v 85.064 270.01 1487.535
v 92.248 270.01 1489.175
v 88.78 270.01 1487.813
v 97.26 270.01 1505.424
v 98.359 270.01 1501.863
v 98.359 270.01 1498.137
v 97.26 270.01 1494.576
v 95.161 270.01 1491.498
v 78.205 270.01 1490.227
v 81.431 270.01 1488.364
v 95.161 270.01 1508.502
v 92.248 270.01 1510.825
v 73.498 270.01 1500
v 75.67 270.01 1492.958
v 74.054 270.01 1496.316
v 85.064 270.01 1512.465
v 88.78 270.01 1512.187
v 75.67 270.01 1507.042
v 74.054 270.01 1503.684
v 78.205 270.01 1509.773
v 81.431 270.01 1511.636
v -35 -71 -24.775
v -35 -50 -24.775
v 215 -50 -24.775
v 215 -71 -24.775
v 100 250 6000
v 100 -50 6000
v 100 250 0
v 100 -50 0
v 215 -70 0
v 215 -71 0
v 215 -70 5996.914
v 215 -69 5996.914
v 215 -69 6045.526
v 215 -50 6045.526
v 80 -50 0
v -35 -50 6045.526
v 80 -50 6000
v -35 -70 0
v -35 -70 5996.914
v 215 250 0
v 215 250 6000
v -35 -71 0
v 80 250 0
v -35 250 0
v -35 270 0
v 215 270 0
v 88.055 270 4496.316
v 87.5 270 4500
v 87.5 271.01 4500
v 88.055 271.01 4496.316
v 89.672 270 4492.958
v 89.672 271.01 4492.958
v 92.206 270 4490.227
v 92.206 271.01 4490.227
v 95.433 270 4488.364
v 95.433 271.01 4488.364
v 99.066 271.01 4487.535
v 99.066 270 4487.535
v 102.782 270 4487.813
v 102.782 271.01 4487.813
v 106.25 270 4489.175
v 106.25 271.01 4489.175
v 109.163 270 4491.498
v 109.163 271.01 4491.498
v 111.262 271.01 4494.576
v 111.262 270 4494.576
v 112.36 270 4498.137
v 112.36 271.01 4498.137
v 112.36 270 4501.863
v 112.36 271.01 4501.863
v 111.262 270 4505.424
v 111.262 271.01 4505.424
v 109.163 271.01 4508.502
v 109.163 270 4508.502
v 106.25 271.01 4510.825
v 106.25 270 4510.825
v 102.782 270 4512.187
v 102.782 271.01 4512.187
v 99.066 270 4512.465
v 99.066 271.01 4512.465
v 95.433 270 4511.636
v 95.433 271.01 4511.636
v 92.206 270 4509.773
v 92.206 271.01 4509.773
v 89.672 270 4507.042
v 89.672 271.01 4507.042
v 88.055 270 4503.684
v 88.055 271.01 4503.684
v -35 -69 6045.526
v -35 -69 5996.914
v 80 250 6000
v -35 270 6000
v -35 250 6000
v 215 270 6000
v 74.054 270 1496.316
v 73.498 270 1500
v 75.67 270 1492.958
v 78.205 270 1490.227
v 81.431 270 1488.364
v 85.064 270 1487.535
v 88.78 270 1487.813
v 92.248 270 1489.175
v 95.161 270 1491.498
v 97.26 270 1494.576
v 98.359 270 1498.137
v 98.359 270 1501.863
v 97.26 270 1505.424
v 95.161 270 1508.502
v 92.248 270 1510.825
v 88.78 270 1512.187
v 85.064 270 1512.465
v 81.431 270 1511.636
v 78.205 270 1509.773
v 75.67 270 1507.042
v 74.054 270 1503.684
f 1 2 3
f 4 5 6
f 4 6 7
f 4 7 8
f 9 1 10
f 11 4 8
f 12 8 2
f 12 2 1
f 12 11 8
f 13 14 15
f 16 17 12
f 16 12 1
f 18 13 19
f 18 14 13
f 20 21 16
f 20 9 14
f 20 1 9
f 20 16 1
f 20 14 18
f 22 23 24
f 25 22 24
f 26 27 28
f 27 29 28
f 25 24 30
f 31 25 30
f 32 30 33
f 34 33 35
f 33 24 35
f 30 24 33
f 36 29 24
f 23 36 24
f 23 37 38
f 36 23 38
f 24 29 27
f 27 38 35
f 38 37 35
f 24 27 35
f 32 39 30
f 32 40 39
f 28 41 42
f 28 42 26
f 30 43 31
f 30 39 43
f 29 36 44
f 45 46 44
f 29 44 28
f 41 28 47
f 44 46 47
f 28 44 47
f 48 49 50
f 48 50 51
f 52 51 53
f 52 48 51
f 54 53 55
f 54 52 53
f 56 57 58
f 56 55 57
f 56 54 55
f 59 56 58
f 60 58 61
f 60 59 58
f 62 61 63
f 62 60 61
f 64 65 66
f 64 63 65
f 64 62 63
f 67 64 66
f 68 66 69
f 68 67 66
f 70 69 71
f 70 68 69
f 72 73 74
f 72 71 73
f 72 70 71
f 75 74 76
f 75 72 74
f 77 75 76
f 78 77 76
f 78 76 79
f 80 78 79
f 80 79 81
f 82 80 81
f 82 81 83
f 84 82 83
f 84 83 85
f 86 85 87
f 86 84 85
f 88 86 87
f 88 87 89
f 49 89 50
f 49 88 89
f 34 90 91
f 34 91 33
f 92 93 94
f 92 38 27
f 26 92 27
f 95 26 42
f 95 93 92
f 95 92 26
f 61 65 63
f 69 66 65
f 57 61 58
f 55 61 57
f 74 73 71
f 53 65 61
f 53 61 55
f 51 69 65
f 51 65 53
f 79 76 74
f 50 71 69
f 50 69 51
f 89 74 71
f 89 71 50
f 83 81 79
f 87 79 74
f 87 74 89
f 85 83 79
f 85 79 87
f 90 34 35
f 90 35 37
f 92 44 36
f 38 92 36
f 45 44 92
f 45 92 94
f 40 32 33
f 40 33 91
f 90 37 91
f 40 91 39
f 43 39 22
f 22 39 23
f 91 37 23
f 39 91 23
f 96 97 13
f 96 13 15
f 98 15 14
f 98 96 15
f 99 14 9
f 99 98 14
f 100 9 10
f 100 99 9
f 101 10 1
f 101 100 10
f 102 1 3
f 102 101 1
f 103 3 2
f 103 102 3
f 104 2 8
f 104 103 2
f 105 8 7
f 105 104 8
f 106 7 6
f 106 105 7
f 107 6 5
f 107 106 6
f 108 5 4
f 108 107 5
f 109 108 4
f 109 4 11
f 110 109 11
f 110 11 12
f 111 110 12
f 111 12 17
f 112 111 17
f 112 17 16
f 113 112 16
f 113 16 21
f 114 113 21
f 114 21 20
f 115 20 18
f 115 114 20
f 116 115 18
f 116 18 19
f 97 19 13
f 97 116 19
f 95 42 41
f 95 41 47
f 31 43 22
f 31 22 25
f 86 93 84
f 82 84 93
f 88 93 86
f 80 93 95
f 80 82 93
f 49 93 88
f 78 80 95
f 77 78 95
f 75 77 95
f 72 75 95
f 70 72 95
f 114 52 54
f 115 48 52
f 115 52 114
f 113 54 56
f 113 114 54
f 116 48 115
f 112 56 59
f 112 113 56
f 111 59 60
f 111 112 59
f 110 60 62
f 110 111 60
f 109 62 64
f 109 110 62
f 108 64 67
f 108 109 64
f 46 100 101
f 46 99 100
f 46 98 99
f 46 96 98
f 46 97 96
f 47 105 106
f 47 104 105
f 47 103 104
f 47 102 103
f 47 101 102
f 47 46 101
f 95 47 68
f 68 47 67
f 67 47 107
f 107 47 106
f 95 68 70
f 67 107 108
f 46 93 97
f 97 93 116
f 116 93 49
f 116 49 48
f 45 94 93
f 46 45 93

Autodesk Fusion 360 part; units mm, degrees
sketch "Sketch1" plane through (0, 0, 0) normal (0, 0, 1) x (1, 0, 0)
  line L0 (-35, -70) -> (215, -70)
  line L1 (215, -70) -> (215, -50)
  line L2 (215, -50) -> (-35, -50)
  line L3 (-35, -50) -> (-35, -70)
  line L4 (80, -50) -> (100, -50)
  line L5 (100, -50) -> (100, 250)
  line L6 (100, 250) -> (80, 250)
  line L7 (80, 250) -> (80, -50)
  line L8 (-35, 250) -> (-35, 270)
  line L9 (215, 250) -> (215, 270)
  line L10 (215, 250) -> (-35, 250)
  line L11 (-35, 250) -> (-35, 270)
  line L12 (-35, 270) -> (215, 270)
  line L13 (215, 270) -> (215, 250)
  dimension "d1" = 250
  dimension "d2" = 20
  dimension "d3" = 20
  dimension "d4" = 300
  dimension "d5" = 20
  dimension "d6" = 115
  dimension "d7" = 115
  dimension "d8" = 115
  dimension "d9" = 115
extrude "Extrude1" add sketch "Sketch1" along normal blind 6000
sketch "Sketch2" plane through (0, 270, 0) normal (0, 1, 0) x (-1, 0, 0)
  line L0 (-215, 0) -> (35, 0)
  line L1 (35, 0) -> (35, 6000)
  line L2 (35, 6000) -> (-215, 6000)
  line L3 (-215, 6000) -> (-215, 0)
  circle A0 centre (-100, 4500) radius 12.5
  circle A1 centre (-100, 1500) radius 12.5
  dimension "d12" = 25
  dimension "d13" = 1500
  dimension "d14" = 25
  dimension "d15" = 1500
extrude "Extrude2" add sketch "Sketch2" along normal blind 1 contours A0
extrude "Extrude3" add 1 faces at (100.9272, 271, 4491.2435) along direction (0, 1, 0) blind 0.01
sketch "Sketch3" plane through (0, 270, 0) normal (0, 1, 0) x (-1, 0, 0)
  circle A0 centre (-100, 4500) radius 12.5
  line L0 (-215, 0) -> (35, 0)
  line L1 (35, 0) -> (35, 6000)
  line L2 (35, 6000) -> (-215, 6000)
  line L3 (-215, 6000) -> (-215, 0)
  circle A1 centre (-85.9982, 1500) radius 12.5
  dimension "d20" = 25
  dimension "d21" = 1500
extrude "Extrude4" add sketch "Sketch3" along normal blind 0.01 contours A1
sketch "Sketch4" plane through (0, -70, 0) normal (0, -1, 0) x (1, 0, 0)
  line L0 (-35, 0) -> (215, 0)
  line L1 (215, 0) -> (215, 6000)
  line L2 (215, 6000) -> (-35, 6000)
  line L3 (-35, 6000) -> (-35, 0)
  line L4 (-35, 0) -> (215, 0)
  line L5 (215, 0) -> (215, -24.7751)
  line L6 (215, -24.7751) -> (-35, -24.7751)
  line L7 (-35, -24.7751) -> (-35, 0)
  line L8 (-35, 6000) -> (215, 6000)
  line L9 (215, 6000) -> (215, 6030.0887)
  line L10 (215, 6030.0887) -> (-35, 6030.0887)
  line L11 (-35, 6030.0887) -> (-35, 6000)
extrude "Extrude5" add sketch "Sketch4" against normal blind 20 contours L0 L4 L5 L6 L7
sketch "Sketch5" plane through (0, -70, 0) normal (0, -1, 0) x (1, 0, 0)
  line L0 (215, -24.7751) -> (215, 6000)
  line L1 (215, 6000) -> (-35, 6000)
  line L2 (-35, 6000) -> (-35, -24.7751)
  line L3 (-35, -24.7751) -> (215, -24.7751)
  line L4 (-35, 6000) -> (215, 6000)
  line L5 (215, 6000) -> (215, 6045.5256)
  line L6 (215, 6045.5256) -> (-35, 6045.5256)
  line L7 (-35, 6045.5256) -> (-35, 6000)
extrude "Extrude6" add sketch "Sketch5" against normal blind 20 contours L1 L4 L5 L6 L7
sketch "Sketch6" plane through (0, -50, 0) normal (0, 1, 0) x (-1, 0, 0)
  line L0 (-80, 6000) -> (-80, 0)
  line L1 (-80, 0) -> (-100, 0)
  line L2 (-100, 0) -> (-100, 6000)
  line L3 (-100, 6000) -> (-80, 6000)
  line L4 (35, -24.7751) -> (35, 6045.5256)
  line L5 (35, 6045.5256) -> (-215, 6045.5256)
  line L6 (-215, 6045.5256) -> (-215, -24.7751)
  line L7 (-215, -24.7751) -> (35, -24.7751)
  line L8 (35, 0) -> (44.2199, 0)
  line L9 (-215, 6009.7723) -> (200, 6009.7723)
  line L10 (200, 6009.7723) -> (-385.0295, 6009.7723)
  line L11 (-228.2182, 6046.4588) -> (-228.2182, 6009.7723)
  line L12 (25.7445, 6045.5256) -> (28.1278, 6009.7723)
  line L13 (-212.657, -24.7751) -> (-212.657, -35.5984)
  line L14 (44.2199, 0) -> (35, 0)
  line L15 (-215, 0) -> (-224.2, 0)
  line L16 (55.9142, -33.1803) -> (55.9142, 0)
  line L17 (55.9142, 0) -> (35, 0)
sketch "Sketch7" plane through (0, 0, 0) normal (0, 1, 0) x (1, 0, 0)
  line L0 (215, 24.7751) -> (-35, 24.7751)
  point P0 (80, 0)
  dimension "d28" = 24.7751
sketch "Sketch8" plane through (0, -70, 0) normal (0, -1, 0) x (1, 0, 0)
  line L0 (215, -24.7751) -> (215, 6045.5256)
  line L1 (215, 6045.5256) -> (-35, 6045.5256)
  line L2 (-35, 6045.5256) -> (-35, -24.7751)
  line L3 (-35, -24.7751) -> (215, -24.7751)
  line L4 (-35, -24.7751) -> (-35, 0)
  line L5 (215, 0) -> (215, -24.7751)
  line L6 (-35, 0) -> (215, 0)
extrude "Extrude7" add sketch "Sketch8" along normal blind 1 contours L0 L2 L3 L4 L5 L6
sketch "Sketch9" plane through (0, -70, 0) normal (0, -1, 0) x (1, 0, 0)
  line L0 (-35, 0) -> (215, 0)
  line L1 (215, 0) -> (215, 6045.5256)
  line L2 (215, 6045.5256) -> (-35, 6045.5256)
  line L3 (-35, 6045.5256) -> (-35, 0)
  line L4 (-35, 6045.5256) -> (-35, 5996.9144)
  line L5 (215, 5996.9144) -> (-35, 5996.9144)
  line L6 (215, 6045.5256) -> (215, 5996.9144)
  line L7 (215, 6045.5256) -> (-35, 6045.5256)
extrude "Extrude8" cut sketch "Sketch9" against normal blind 1 contours L1 L2 L3 L4 L5 L6 L7
